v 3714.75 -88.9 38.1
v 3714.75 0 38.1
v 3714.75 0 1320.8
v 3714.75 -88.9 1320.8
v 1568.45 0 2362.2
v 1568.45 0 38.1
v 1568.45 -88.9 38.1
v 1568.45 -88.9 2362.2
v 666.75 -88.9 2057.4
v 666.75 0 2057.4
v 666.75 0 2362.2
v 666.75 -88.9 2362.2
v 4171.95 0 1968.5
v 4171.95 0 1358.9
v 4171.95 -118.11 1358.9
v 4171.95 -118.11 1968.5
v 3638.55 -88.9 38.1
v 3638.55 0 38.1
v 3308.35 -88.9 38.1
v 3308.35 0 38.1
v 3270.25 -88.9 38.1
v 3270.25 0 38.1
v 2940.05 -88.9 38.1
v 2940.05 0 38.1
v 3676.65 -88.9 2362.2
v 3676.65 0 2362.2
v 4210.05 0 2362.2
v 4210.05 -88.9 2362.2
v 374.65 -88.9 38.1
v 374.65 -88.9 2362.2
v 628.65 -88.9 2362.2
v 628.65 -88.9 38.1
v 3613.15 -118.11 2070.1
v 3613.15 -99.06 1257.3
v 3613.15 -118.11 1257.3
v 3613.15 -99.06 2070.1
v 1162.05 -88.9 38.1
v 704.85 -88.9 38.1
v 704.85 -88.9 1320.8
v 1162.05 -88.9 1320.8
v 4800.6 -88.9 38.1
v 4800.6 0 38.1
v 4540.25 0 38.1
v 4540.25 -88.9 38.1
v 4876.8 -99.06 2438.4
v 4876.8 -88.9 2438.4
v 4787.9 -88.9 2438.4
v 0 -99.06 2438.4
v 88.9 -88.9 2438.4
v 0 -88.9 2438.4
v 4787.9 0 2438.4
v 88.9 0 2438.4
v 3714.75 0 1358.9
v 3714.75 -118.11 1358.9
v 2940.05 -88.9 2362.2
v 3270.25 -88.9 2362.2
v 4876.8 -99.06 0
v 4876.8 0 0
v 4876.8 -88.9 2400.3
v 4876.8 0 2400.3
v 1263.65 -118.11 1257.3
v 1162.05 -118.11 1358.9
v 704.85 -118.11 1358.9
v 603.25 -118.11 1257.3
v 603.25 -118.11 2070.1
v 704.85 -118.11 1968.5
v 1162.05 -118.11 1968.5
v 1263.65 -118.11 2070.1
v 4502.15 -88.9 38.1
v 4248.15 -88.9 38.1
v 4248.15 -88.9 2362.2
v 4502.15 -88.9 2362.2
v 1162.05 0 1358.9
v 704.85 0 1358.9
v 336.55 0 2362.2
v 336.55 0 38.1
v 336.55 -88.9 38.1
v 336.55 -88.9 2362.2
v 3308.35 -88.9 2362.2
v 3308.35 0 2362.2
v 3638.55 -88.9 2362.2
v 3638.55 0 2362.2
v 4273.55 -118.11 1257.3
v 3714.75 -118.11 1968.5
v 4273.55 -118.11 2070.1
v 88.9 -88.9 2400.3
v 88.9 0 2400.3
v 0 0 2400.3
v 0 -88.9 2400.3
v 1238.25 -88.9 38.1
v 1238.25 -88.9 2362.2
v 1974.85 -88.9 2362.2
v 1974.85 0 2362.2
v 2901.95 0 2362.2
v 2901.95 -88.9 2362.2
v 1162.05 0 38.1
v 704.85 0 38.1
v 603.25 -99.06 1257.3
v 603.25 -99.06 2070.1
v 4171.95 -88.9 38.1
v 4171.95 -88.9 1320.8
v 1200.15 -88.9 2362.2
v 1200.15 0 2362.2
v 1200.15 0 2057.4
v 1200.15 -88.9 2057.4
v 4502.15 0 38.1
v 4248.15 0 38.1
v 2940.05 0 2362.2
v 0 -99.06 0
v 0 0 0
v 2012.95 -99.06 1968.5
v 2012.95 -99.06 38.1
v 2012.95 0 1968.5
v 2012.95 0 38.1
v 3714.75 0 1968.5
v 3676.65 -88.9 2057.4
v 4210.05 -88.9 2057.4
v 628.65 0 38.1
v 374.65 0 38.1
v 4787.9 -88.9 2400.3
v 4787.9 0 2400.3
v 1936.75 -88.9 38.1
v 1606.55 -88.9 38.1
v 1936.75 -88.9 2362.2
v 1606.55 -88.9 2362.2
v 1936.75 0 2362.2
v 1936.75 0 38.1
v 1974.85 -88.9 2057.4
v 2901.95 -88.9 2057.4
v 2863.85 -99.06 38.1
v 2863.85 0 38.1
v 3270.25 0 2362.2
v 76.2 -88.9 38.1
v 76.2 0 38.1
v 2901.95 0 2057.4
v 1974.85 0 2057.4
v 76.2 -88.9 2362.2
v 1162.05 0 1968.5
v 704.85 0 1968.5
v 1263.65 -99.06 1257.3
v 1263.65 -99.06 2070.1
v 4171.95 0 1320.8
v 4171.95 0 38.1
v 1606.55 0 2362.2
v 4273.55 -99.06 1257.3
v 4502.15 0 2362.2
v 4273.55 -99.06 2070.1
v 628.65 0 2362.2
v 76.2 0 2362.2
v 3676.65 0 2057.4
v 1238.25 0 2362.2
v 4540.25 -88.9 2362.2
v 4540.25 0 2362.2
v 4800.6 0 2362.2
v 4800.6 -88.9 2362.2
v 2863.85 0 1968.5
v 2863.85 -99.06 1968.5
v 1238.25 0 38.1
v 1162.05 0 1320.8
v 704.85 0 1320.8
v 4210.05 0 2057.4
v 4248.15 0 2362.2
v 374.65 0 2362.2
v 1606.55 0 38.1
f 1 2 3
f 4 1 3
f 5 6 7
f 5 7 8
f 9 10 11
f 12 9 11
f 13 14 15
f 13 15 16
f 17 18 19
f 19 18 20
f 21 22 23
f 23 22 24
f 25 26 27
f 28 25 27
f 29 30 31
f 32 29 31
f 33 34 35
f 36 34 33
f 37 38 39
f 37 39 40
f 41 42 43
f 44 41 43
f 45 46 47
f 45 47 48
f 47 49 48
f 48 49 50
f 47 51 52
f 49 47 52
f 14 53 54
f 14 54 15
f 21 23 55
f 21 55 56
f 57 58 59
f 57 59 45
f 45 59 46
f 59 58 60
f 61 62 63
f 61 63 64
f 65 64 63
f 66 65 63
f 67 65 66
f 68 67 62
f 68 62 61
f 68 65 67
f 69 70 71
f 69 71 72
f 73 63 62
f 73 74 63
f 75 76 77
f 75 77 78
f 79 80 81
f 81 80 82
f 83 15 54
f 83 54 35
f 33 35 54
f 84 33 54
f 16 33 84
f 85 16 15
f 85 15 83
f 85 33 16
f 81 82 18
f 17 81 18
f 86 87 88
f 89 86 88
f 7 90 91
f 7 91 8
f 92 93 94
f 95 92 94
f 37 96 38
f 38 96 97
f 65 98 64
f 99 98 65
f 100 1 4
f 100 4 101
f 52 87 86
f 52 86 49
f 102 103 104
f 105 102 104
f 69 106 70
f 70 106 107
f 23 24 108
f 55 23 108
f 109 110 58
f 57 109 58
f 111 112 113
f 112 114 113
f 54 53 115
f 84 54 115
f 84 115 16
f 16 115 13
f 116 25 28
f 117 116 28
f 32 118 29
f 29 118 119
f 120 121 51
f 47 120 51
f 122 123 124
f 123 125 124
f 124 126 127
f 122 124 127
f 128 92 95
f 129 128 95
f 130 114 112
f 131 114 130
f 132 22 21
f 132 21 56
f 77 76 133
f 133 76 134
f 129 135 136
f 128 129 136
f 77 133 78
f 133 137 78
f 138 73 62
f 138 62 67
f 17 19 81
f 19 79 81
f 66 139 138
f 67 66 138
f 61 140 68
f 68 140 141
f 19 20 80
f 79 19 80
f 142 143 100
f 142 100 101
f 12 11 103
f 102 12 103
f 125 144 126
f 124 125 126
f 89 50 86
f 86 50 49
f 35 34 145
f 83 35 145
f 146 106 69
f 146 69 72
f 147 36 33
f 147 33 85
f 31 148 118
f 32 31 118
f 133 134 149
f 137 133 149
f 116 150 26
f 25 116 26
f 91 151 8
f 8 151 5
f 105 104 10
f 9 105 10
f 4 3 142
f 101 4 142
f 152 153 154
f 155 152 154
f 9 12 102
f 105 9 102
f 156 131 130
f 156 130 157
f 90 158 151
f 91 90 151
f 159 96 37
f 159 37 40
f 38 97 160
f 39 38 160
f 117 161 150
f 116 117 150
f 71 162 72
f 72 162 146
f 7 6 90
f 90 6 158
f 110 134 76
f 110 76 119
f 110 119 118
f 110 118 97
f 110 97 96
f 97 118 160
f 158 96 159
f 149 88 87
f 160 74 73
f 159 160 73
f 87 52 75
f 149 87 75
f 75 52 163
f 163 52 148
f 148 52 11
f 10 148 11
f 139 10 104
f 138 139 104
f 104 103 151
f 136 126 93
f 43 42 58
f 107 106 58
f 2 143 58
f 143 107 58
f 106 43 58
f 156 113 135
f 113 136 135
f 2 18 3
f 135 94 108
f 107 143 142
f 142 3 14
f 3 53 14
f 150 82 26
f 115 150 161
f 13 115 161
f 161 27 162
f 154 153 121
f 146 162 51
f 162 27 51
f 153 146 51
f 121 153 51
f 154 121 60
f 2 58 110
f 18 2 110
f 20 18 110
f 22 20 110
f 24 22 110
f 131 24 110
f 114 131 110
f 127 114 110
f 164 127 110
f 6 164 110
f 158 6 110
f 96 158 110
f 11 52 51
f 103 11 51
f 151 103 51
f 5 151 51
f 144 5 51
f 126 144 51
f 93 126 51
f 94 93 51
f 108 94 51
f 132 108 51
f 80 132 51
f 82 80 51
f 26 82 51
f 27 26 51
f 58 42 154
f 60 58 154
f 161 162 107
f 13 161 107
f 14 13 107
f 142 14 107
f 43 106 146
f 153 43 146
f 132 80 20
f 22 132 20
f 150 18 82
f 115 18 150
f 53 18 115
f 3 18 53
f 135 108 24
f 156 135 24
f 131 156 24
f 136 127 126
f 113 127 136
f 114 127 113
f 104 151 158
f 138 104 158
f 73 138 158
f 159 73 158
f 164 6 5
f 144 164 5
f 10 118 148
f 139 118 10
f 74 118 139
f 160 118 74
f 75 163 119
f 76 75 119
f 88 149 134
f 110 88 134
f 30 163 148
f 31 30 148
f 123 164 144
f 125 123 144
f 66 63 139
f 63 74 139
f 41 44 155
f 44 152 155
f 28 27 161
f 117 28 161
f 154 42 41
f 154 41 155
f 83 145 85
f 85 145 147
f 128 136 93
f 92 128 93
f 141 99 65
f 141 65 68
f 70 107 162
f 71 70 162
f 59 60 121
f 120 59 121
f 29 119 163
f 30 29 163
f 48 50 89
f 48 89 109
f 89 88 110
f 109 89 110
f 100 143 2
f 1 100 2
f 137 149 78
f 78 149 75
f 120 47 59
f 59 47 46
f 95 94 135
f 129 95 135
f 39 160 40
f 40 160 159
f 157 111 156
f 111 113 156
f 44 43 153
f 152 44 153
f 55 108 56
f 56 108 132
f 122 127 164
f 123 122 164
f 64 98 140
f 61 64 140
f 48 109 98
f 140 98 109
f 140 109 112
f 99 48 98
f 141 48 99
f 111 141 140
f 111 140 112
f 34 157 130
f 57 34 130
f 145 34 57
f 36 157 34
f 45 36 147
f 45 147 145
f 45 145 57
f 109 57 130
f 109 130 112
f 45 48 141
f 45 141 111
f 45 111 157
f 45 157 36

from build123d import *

# Parameters (mm, degrees)
F0_W     = 38.1
F0_H     = 2324.1
F0_H_2   = 609.6
F0_W_2   = 4699
F0_H_3   = 38.1
F0_H_4   = 1930.4
F0_H_5   = 1282.7
F1_DEPTH = 88.9
F2_W     = 850.9
F2_H     = 1930.4
F2_W_2   = 457.2
F2_H_2   = 609.6
F3_DEPTH = 10.16
F4_W     = 660.4
F4_H     = 812.8
F4_W_2   = 457.2
F4_H_2   = 609.6
F5_DEPTH = 19.05


# Not quite as in the source:
# - a feature names something its author has since deleted; it is built from what else it names


with BuildPart() as f1:
    # F0 (on Front) → F1 (new body)
    with BuildSketch(Plane.XZ):
        with Locations((19.05, 1200.15)):
            Rectangle(F0_W, F0_H)
        with Locations((57.15, 1200.15)):
            Rectangle(F0_W, F0_H)
        Polygon((0, 38.1), (0, 0), (4876.8, 0), (4876.8, 38.1), (4838.7, 38.1), (4800.6, 38.1), (4540.25, 38.1), (4502.15, 38.1), (4248.15, 38.1), (4210.05, 38.1), (4171.95, 38.1), (3714.75, 38.1), (3676.65, 38.1), (3638.55, 38.1), (3308.35, 38.1), (3270.25, 38.1), (2940.05, 38.1), (2901.95, 38.1), (2863.85, 38.1), (2012.95, 38.1), (1974.85, 38.1), (1936.75, 38.1), (1606.55, 38.1), (1568.45, 38.1), (1238.25, 38.1), (1200.15, 38.1), (1162.05, 38.1), (704.85, 38.1), (666.75, 38.1), (628.65, 38.1), (374.65, 38.1), (336.55, 38.1), (76.2, 38.1), (38.1, 38.1), align=None)
        with Locations((355.6, 1200.15)):
            Rectangle(F0_W, F0_H)
        Polygon((628.65, 2362.2), (628.65, 38.1), (666.75, 38.1), (666.75, 1320.8), (666.75, 1358.9), (666.75, 1968.5), (666.75, 2057.4), (666.75, 2362.2), align=None)
        Polygon((1200.15, 1320.8), (1200.15, 38.1), (1238.25, 38.1), (1238.25, 2362.2), (1200.15, 2362.2), (1200.15, 2057.4), (1200.15, 1968.5), (1200.15, 1358.9), align=None)
        Polygon((895.35, 2057.4), (666.75, 2057.4), (666.75, 1968.5), (704.85, 1968.5), (1162.05, 1968.5), (1200.15, 1968.5), (1200.15, 2057.4), (933.45, 2057.4), align=None)
        with Locations((685.8, 1663.7)):
            Rectangle(F0_W, F0_H_2)
        with Locations((1181.1, 1663.7)):
            Rectangle(F0_W, F0_H_2)
        Polygon((666.75, 1358.9), (666.75, 1320.8), (704.85, 1320.8), (1162.05, 1320.8), (1200.15, 1320.8), (1200.15, 1358.9), (1162.05, 1358.9), (704.85, 1358.9), align=None)
        Polygon((0, 2400.3), (0, 2362.2), (38.1, 2362.2), (76.2, 2362.2), (336.55, 2362.2), (374.65, 2362.2), (628.65, 2362.2), (666.75, 2362.2), (895.35, 2362.2), (933.45, 2362.2), (1200.15, 2362.2), (1238.25, 2362.2), (1568.45, 2362.2), (1606.55, 2362.2), (1936.75, 2362.2), (1974.85, 2362.2), (2901.95, 2362.2), (2940.05, 2362.2), (3270.25, 2362.2), (3308.35, 2362.2), (3638.55, 2362.2), (3676.65, 2362.2), (4210.05, 2362.2), (4248.15, 2362.2), (4502.15, 2362.2), (4540.25, 2362.2), (4800.6, 2362.2), (4838.7, 2362.2), (4876.8, 2362.2), (4876.8, 2400.3), (4787.9, 2400.3), (88.9, 2400.3), align=None)
        with Locations((2438.4, 2419.35)):
            Rectangle(F0_W_2, F0_H_3)
        with Locations((1587.5, 1200.15)):
            Rectangle(F0_W, F0_H)
        with Locations((4857.75, 1200.15)):
            Rectangle(F0_W, F0_H)
        with Locations((4819.65, 1200.15)):
            Rectangle(F0_W, F0_H)
        with Locations((3289.3, 1200.15)):
            Rectangle(F0_W, F0_H)
        Polygon((4171.95, 1320.8), (4210.05, 1320.8), (4210.05, 1358.9), (4171.95, 1358.9), (3714.75, 1358.9), (3676.65, 1358.9), (3676.65, 1320.8), (3714.75, 1320.8), align=None)
        with Locations((3695.7, 1663.7)):
            Rectangle(F0_W, F0_H_2)
        Polygon((3676.65, 2057.4), (3676.65, 2362.2), (3638.55, 2362.2), (3638.55, 38.1), (3676.65, 38.1), (3676.65, 1320.8), (3676.65, 1358.9), (3676.65, 1968.5), align=None)
        with Locations((4191, 1663.7)):
            Rectangle(F0_W, F0_H_2)
        Polygon((4210.05, 38.1), (4248.15, 38.1), (4248.15, 2362.2), (4210.05, 2362.2), (4210.05, 2057.4), (4210.05, 1968.5), (4210.05, 1358.9), (4210.05, 1320.8), align=None)
        Polygon((4210.05, 1968.5), (4210.05, 2057.4), (3676.65, 2057.4), (3676.65, 1968.5), (3714.75, 1968.5), (4171.95, 1968.5), align=None)
        with Locations((4521.2, 1200.15)):
            Rectangle(F0_W, F0_H)
        Polygon((1936.75, 2362.2), (1936.75, 38.1), (1974.85, 38.1), (1974.85, 1968.5), (1974.85, 2057.4), (1974.85, 2362.2), align=None)
        Polygon((2940.05, 38.1), (2940.05, 2362.2), (2901.95, 2362.2), (2901.95, 2057.4), (2901.95, 1968.5), (2901.95, 38.1), align=None)
        with Locations((1993.9, 1003.3)):
            Rectangle(F0_W, F0_H_4)
        Polygon((2901.95, 1968.5), (2901.95, 2057.4), (1974.85, 2057.4), (1974.85, 1968.5), (2012.95, 1968.5), (2863.85, 1968.5), align=None)
        with Locations((2882.9, 1003.3)):
            Rectangle(F0_W, F0_H_4)
        with Locations((3695.7, 679.45)):
            Rectangle(F0_W, F0_H_5)
        with Locations((4191, 679.45)):
            Rectangle(F0_W, F0_H_5)
        with Locations((685.8, 679.45)):
            Rectangle(F0_W, F0_H_5)
        with Locations((1181.1, 679.45)):
            Rectangle(F0_W, F0_H_5)
    extrude(amount=F1_DEPTH)

    # F2 (on face) → F3 (join)
    with BuildSketch(Plane.XZ.offset(88.9)):
        Polygon((0, 2400.3), (0, 0), (4876.8, 0), (4876.8, 2400.3), (4876.8, 2438.4), (4787.9, 2438.4), (88.9, 2438.4), (0, 2438.4), align=None)
        with Locations((2438.4, 1003.3)):
            Rectangle(F2_W, F2_H, mode=Mode.SUBTRACT)
        with Locations((933.45, 1663.7)):
            Rectangle(F2_W_2, F2_H_2, mode=Mode.SUBTRACT)
        with Locations((3943.35, 1663.7)):
            Rectangle(F2_W_2, F2_H_2, mode=Mode.SUBTRACT)
    extrude(amount=F3_DEPTH)

    # F4 (on face) → F5 (join)
    with BuildSketch(Plane.XZ.offset(99.06)):
        with Locations((933.45, 1663.7)):
            Rectangle(F4_W, F4_H)
        with Locations((933.45, 1663.7)):
            Rectangle(F4_W_2, F4_H_2, mode=Mode.SUBTRACT)
        with Locations((3943.35, 1663.7)):
            Rectangle(F4_W, F4_H)
        with Locations((3943.35, 1663.7)):
            Rectangle(F4_W_2, F4_H_2, mode=Mode.SUBTRACT)
    extrude(amount=F5_DEPTH)


solid = f1.part
